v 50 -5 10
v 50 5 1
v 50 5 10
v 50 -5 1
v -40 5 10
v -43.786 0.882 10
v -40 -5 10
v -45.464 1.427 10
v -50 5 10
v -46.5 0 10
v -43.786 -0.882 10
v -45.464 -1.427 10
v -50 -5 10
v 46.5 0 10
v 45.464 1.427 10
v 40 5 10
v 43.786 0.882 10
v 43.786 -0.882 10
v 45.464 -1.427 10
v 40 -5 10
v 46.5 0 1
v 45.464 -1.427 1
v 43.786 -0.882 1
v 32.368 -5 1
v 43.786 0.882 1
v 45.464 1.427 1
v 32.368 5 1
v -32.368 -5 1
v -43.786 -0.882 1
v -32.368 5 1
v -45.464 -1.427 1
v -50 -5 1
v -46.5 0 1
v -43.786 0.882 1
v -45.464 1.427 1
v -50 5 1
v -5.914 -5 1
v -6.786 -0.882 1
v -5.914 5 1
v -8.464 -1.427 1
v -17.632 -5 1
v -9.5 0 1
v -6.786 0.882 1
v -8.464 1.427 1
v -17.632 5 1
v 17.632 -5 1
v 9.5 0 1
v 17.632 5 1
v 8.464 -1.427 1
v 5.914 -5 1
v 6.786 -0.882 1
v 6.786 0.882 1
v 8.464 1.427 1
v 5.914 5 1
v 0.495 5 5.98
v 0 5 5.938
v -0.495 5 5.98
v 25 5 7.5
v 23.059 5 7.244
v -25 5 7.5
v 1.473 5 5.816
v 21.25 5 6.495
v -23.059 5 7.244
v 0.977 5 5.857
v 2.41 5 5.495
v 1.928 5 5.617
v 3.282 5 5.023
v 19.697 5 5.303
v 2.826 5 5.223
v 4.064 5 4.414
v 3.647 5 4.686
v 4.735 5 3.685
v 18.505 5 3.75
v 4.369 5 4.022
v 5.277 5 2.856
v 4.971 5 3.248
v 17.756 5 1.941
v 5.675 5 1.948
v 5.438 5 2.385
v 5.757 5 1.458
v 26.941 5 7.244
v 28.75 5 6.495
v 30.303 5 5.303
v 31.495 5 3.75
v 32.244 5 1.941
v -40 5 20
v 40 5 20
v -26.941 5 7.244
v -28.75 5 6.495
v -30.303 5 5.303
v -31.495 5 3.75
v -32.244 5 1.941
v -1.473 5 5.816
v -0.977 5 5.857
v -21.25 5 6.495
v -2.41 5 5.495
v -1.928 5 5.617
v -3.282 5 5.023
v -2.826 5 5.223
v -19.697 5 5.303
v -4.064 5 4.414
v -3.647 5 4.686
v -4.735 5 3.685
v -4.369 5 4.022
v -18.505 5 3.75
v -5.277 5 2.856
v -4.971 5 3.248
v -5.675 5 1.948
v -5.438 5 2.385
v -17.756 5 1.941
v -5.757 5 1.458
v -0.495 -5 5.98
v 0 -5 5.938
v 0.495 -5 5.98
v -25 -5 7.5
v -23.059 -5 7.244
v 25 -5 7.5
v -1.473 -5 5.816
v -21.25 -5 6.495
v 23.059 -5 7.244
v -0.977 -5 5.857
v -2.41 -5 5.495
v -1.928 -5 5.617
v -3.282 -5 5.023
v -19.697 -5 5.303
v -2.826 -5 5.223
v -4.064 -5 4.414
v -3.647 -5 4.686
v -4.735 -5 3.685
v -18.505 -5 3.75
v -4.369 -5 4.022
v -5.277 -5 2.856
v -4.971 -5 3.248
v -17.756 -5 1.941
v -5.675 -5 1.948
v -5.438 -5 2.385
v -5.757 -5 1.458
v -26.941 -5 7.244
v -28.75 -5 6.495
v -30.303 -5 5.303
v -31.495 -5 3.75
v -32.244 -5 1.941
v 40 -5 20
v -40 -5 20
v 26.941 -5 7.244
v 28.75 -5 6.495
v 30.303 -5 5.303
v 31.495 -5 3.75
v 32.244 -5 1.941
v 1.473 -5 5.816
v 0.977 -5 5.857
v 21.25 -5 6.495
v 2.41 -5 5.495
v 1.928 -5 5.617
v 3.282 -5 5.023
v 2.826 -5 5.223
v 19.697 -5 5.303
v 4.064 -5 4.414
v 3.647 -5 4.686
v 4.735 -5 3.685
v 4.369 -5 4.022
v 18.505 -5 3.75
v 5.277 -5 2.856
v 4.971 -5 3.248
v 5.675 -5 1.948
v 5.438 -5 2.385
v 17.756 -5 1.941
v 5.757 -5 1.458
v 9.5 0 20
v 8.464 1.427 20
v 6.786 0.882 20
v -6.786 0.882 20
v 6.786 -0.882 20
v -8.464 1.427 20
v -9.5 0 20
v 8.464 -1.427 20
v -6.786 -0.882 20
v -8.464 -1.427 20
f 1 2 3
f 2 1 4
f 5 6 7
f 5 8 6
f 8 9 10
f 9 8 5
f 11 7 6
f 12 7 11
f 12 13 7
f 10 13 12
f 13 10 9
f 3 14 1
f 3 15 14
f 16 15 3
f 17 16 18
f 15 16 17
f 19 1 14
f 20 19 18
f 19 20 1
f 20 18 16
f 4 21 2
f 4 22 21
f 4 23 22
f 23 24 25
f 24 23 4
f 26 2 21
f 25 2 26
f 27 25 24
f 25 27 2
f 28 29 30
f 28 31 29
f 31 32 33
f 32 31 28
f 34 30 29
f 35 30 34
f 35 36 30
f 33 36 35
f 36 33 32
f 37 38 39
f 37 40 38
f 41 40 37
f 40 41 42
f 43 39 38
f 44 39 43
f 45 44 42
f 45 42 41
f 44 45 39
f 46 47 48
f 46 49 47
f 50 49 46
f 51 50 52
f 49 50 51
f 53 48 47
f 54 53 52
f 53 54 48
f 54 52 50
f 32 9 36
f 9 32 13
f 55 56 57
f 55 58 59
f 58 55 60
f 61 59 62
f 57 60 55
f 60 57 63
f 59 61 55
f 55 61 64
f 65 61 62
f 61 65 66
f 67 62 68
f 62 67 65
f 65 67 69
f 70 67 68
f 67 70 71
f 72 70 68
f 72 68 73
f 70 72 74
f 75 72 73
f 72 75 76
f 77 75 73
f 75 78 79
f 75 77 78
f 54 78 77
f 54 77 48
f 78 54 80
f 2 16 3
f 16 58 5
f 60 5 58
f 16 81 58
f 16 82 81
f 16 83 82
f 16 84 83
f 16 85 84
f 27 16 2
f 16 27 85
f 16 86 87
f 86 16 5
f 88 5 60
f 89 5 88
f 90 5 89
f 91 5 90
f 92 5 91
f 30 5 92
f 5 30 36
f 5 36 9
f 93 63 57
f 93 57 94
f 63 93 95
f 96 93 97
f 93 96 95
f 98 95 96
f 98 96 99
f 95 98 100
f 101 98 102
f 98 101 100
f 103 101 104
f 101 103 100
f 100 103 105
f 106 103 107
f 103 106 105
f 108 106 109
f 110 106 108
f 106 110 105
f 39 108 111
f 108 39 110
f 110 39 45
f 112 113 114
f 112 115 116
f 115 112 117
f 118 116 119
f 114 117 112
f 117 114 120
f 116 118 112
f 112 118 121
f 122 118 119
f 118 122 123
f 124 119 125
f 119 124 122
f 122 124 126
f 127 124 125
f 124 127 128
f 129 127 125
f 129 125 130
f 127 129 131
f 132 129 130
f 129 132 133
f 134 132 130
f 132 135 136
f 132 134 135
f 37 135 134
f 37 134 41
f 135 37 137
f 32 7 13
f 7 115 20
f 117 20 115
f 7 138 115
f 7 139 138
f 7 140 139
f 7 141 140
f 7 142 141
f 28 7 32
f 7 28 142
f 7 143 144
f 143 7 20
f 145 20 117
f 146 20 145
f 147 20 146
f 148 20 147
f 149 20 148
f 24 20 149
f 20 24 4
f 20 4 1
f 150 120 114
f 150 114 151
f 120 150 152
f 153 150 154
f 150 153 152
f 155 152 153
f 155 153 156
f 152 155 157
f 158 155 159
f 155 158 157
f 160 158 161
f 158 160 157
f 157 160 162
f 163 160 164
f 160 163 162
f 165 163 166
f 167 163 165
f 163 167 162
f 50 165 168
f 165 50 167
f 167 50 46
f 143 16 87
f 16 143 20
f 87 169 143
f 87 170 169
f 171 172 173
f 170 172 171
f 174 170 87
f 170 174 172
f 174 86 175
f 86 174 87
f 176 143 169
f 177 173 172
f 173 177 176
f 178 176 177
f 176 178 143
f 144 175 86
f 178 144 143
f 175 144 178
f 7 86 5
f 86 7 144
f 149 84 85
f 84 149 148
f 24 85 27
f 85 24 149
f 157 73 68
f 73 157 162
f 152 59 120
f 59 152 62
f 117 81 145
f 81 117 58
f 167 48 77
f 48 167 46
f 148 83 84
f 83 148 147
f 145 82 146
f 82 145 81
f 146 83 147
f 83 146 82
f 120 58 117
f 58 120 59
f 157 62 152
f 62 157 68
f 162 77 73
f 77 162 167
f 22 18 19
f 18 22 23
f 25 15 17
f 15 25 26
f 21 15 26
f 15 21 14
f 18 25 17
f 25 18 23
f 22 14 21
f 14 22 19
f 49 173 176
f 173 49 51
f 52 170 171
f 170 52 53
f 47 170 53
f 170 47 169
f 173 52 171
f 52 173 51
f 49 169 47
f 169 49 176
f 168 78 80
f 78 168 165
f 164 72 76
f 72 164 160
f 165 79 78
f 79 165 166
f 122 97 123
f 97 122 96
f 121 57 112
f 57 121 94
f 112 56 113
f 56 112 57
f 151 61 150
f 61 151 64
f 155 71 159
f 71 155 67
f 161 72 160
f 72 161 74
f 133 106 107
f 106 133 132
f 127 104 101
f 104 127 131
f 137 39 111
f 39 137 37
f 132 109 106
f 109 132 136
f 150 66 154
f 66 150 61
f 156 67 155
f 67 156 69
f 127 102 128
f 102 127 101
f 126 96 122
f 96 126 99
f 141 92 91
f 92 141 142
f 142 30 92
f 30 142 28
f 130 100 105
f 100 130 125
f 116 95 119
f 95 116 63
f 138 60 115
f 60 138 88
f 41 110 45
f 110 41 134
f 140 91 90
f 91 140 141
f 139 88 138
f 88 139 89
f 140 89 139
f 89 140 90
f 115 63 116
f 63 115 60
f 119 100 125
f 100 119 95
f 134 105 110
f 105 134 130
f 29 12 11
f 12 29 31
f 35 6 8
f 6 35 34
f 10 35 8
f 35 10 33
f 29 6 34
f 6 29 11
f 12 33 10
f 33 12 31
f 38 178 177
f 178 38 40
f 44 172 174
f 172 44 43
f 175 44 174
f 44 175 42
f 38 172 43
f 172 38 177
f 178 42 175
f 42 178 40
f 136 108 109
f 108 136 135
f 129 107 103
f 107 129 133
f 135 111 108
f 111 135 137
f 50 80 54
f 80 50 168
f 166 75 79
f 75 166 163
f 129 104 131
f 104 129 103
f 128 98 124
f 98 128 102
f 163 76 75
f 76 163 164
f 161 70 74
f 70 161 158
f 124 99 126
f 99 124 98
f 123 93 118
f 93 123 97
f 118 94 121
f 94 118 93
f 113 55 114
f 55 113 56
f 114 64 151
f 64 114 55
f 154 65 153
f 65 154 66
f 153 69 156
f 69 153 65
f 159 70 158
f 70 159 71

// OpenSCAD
//100, 40, 10, 15, 12, 3, 50

module clamp(l=100, h=40, t=10, sd=15, md=12, bd=3, s=50, eh=20) {
  /*
    l=length
    h=height
    t=thickness
    sd=side holes diameter
    md=middle hole diameter
    bd=bolt diameter
    s=span between side holes
    eh=extruded edge height
  */

  gap=2; // gap between two clamps


  module main_block() {
    translate([0, 0, eh/4+gap/4]) cube([l, t, eh/2 - gap/2], center=true);
    translate([0, 0, h/4+gap/4]) cube([l-t*2, t, h/2 - gap/2], center=true);

  }
  module holes() {
      translate([s/2, 0, 0]) rotate([90, 0, 0]) cylinder(h=t+2, r=sd/2, center=true);
      //Holes for outer bolts
      translate([l/2-t/2, 0, h/4]) cylinder(h=h/2+2, r=bd/2, center=true);
      
      //Holes for inner bolts
      translate([md/2+2, 0, h/4]) cylinder(h=h/2+2, r=bd/2, center=true);

      //Middle hole
      rotate([90, 0, 0]) cylinder(h=t+2, r=md/2, center=true);
  }

  //Extrude holes from block
  difference() {
    main_block();
    union() {
      holes();
      mirror([1, 0, 0]) holes();
    }
  }
}

// Creates double clamp with stepper mount
module double_clamp(l,h,t,sd,md,bd,s,eh) {
    difference() {
      union() {
	clamp(l,h,t,sd,md,bd,s,eh);
	mirror([0, 0, 1]) mirror([1, 0, 0]) clamp(l,h,t,sd,md,bd,s,eh);
      }
      stepper_mount(11);
    }
}

module stepper_mount(depth) {
  module hole() {
    s=31; // Distance between holes on mount
    l=2; // Hole l
    $fn=50;

    translate([s/2, 0, s/2]) 
      rotate([90, 90, 0])
        hull() {
	  translate([l/2, 0, 0]) cylinder(h=depth, r=3/2, center=true);
	  translate([-l/2, 0, 0]) cylinder(h=depth, r=3/2, center=true);
	}
  }

  // Rotating to make 4 holes
  for (i=[0:4]) {
    rotate([0, 360/4*i, 0]) hole();
  }
}


clamp(100, 40, 10, 15, 12, 3, 50, 20, 40);
